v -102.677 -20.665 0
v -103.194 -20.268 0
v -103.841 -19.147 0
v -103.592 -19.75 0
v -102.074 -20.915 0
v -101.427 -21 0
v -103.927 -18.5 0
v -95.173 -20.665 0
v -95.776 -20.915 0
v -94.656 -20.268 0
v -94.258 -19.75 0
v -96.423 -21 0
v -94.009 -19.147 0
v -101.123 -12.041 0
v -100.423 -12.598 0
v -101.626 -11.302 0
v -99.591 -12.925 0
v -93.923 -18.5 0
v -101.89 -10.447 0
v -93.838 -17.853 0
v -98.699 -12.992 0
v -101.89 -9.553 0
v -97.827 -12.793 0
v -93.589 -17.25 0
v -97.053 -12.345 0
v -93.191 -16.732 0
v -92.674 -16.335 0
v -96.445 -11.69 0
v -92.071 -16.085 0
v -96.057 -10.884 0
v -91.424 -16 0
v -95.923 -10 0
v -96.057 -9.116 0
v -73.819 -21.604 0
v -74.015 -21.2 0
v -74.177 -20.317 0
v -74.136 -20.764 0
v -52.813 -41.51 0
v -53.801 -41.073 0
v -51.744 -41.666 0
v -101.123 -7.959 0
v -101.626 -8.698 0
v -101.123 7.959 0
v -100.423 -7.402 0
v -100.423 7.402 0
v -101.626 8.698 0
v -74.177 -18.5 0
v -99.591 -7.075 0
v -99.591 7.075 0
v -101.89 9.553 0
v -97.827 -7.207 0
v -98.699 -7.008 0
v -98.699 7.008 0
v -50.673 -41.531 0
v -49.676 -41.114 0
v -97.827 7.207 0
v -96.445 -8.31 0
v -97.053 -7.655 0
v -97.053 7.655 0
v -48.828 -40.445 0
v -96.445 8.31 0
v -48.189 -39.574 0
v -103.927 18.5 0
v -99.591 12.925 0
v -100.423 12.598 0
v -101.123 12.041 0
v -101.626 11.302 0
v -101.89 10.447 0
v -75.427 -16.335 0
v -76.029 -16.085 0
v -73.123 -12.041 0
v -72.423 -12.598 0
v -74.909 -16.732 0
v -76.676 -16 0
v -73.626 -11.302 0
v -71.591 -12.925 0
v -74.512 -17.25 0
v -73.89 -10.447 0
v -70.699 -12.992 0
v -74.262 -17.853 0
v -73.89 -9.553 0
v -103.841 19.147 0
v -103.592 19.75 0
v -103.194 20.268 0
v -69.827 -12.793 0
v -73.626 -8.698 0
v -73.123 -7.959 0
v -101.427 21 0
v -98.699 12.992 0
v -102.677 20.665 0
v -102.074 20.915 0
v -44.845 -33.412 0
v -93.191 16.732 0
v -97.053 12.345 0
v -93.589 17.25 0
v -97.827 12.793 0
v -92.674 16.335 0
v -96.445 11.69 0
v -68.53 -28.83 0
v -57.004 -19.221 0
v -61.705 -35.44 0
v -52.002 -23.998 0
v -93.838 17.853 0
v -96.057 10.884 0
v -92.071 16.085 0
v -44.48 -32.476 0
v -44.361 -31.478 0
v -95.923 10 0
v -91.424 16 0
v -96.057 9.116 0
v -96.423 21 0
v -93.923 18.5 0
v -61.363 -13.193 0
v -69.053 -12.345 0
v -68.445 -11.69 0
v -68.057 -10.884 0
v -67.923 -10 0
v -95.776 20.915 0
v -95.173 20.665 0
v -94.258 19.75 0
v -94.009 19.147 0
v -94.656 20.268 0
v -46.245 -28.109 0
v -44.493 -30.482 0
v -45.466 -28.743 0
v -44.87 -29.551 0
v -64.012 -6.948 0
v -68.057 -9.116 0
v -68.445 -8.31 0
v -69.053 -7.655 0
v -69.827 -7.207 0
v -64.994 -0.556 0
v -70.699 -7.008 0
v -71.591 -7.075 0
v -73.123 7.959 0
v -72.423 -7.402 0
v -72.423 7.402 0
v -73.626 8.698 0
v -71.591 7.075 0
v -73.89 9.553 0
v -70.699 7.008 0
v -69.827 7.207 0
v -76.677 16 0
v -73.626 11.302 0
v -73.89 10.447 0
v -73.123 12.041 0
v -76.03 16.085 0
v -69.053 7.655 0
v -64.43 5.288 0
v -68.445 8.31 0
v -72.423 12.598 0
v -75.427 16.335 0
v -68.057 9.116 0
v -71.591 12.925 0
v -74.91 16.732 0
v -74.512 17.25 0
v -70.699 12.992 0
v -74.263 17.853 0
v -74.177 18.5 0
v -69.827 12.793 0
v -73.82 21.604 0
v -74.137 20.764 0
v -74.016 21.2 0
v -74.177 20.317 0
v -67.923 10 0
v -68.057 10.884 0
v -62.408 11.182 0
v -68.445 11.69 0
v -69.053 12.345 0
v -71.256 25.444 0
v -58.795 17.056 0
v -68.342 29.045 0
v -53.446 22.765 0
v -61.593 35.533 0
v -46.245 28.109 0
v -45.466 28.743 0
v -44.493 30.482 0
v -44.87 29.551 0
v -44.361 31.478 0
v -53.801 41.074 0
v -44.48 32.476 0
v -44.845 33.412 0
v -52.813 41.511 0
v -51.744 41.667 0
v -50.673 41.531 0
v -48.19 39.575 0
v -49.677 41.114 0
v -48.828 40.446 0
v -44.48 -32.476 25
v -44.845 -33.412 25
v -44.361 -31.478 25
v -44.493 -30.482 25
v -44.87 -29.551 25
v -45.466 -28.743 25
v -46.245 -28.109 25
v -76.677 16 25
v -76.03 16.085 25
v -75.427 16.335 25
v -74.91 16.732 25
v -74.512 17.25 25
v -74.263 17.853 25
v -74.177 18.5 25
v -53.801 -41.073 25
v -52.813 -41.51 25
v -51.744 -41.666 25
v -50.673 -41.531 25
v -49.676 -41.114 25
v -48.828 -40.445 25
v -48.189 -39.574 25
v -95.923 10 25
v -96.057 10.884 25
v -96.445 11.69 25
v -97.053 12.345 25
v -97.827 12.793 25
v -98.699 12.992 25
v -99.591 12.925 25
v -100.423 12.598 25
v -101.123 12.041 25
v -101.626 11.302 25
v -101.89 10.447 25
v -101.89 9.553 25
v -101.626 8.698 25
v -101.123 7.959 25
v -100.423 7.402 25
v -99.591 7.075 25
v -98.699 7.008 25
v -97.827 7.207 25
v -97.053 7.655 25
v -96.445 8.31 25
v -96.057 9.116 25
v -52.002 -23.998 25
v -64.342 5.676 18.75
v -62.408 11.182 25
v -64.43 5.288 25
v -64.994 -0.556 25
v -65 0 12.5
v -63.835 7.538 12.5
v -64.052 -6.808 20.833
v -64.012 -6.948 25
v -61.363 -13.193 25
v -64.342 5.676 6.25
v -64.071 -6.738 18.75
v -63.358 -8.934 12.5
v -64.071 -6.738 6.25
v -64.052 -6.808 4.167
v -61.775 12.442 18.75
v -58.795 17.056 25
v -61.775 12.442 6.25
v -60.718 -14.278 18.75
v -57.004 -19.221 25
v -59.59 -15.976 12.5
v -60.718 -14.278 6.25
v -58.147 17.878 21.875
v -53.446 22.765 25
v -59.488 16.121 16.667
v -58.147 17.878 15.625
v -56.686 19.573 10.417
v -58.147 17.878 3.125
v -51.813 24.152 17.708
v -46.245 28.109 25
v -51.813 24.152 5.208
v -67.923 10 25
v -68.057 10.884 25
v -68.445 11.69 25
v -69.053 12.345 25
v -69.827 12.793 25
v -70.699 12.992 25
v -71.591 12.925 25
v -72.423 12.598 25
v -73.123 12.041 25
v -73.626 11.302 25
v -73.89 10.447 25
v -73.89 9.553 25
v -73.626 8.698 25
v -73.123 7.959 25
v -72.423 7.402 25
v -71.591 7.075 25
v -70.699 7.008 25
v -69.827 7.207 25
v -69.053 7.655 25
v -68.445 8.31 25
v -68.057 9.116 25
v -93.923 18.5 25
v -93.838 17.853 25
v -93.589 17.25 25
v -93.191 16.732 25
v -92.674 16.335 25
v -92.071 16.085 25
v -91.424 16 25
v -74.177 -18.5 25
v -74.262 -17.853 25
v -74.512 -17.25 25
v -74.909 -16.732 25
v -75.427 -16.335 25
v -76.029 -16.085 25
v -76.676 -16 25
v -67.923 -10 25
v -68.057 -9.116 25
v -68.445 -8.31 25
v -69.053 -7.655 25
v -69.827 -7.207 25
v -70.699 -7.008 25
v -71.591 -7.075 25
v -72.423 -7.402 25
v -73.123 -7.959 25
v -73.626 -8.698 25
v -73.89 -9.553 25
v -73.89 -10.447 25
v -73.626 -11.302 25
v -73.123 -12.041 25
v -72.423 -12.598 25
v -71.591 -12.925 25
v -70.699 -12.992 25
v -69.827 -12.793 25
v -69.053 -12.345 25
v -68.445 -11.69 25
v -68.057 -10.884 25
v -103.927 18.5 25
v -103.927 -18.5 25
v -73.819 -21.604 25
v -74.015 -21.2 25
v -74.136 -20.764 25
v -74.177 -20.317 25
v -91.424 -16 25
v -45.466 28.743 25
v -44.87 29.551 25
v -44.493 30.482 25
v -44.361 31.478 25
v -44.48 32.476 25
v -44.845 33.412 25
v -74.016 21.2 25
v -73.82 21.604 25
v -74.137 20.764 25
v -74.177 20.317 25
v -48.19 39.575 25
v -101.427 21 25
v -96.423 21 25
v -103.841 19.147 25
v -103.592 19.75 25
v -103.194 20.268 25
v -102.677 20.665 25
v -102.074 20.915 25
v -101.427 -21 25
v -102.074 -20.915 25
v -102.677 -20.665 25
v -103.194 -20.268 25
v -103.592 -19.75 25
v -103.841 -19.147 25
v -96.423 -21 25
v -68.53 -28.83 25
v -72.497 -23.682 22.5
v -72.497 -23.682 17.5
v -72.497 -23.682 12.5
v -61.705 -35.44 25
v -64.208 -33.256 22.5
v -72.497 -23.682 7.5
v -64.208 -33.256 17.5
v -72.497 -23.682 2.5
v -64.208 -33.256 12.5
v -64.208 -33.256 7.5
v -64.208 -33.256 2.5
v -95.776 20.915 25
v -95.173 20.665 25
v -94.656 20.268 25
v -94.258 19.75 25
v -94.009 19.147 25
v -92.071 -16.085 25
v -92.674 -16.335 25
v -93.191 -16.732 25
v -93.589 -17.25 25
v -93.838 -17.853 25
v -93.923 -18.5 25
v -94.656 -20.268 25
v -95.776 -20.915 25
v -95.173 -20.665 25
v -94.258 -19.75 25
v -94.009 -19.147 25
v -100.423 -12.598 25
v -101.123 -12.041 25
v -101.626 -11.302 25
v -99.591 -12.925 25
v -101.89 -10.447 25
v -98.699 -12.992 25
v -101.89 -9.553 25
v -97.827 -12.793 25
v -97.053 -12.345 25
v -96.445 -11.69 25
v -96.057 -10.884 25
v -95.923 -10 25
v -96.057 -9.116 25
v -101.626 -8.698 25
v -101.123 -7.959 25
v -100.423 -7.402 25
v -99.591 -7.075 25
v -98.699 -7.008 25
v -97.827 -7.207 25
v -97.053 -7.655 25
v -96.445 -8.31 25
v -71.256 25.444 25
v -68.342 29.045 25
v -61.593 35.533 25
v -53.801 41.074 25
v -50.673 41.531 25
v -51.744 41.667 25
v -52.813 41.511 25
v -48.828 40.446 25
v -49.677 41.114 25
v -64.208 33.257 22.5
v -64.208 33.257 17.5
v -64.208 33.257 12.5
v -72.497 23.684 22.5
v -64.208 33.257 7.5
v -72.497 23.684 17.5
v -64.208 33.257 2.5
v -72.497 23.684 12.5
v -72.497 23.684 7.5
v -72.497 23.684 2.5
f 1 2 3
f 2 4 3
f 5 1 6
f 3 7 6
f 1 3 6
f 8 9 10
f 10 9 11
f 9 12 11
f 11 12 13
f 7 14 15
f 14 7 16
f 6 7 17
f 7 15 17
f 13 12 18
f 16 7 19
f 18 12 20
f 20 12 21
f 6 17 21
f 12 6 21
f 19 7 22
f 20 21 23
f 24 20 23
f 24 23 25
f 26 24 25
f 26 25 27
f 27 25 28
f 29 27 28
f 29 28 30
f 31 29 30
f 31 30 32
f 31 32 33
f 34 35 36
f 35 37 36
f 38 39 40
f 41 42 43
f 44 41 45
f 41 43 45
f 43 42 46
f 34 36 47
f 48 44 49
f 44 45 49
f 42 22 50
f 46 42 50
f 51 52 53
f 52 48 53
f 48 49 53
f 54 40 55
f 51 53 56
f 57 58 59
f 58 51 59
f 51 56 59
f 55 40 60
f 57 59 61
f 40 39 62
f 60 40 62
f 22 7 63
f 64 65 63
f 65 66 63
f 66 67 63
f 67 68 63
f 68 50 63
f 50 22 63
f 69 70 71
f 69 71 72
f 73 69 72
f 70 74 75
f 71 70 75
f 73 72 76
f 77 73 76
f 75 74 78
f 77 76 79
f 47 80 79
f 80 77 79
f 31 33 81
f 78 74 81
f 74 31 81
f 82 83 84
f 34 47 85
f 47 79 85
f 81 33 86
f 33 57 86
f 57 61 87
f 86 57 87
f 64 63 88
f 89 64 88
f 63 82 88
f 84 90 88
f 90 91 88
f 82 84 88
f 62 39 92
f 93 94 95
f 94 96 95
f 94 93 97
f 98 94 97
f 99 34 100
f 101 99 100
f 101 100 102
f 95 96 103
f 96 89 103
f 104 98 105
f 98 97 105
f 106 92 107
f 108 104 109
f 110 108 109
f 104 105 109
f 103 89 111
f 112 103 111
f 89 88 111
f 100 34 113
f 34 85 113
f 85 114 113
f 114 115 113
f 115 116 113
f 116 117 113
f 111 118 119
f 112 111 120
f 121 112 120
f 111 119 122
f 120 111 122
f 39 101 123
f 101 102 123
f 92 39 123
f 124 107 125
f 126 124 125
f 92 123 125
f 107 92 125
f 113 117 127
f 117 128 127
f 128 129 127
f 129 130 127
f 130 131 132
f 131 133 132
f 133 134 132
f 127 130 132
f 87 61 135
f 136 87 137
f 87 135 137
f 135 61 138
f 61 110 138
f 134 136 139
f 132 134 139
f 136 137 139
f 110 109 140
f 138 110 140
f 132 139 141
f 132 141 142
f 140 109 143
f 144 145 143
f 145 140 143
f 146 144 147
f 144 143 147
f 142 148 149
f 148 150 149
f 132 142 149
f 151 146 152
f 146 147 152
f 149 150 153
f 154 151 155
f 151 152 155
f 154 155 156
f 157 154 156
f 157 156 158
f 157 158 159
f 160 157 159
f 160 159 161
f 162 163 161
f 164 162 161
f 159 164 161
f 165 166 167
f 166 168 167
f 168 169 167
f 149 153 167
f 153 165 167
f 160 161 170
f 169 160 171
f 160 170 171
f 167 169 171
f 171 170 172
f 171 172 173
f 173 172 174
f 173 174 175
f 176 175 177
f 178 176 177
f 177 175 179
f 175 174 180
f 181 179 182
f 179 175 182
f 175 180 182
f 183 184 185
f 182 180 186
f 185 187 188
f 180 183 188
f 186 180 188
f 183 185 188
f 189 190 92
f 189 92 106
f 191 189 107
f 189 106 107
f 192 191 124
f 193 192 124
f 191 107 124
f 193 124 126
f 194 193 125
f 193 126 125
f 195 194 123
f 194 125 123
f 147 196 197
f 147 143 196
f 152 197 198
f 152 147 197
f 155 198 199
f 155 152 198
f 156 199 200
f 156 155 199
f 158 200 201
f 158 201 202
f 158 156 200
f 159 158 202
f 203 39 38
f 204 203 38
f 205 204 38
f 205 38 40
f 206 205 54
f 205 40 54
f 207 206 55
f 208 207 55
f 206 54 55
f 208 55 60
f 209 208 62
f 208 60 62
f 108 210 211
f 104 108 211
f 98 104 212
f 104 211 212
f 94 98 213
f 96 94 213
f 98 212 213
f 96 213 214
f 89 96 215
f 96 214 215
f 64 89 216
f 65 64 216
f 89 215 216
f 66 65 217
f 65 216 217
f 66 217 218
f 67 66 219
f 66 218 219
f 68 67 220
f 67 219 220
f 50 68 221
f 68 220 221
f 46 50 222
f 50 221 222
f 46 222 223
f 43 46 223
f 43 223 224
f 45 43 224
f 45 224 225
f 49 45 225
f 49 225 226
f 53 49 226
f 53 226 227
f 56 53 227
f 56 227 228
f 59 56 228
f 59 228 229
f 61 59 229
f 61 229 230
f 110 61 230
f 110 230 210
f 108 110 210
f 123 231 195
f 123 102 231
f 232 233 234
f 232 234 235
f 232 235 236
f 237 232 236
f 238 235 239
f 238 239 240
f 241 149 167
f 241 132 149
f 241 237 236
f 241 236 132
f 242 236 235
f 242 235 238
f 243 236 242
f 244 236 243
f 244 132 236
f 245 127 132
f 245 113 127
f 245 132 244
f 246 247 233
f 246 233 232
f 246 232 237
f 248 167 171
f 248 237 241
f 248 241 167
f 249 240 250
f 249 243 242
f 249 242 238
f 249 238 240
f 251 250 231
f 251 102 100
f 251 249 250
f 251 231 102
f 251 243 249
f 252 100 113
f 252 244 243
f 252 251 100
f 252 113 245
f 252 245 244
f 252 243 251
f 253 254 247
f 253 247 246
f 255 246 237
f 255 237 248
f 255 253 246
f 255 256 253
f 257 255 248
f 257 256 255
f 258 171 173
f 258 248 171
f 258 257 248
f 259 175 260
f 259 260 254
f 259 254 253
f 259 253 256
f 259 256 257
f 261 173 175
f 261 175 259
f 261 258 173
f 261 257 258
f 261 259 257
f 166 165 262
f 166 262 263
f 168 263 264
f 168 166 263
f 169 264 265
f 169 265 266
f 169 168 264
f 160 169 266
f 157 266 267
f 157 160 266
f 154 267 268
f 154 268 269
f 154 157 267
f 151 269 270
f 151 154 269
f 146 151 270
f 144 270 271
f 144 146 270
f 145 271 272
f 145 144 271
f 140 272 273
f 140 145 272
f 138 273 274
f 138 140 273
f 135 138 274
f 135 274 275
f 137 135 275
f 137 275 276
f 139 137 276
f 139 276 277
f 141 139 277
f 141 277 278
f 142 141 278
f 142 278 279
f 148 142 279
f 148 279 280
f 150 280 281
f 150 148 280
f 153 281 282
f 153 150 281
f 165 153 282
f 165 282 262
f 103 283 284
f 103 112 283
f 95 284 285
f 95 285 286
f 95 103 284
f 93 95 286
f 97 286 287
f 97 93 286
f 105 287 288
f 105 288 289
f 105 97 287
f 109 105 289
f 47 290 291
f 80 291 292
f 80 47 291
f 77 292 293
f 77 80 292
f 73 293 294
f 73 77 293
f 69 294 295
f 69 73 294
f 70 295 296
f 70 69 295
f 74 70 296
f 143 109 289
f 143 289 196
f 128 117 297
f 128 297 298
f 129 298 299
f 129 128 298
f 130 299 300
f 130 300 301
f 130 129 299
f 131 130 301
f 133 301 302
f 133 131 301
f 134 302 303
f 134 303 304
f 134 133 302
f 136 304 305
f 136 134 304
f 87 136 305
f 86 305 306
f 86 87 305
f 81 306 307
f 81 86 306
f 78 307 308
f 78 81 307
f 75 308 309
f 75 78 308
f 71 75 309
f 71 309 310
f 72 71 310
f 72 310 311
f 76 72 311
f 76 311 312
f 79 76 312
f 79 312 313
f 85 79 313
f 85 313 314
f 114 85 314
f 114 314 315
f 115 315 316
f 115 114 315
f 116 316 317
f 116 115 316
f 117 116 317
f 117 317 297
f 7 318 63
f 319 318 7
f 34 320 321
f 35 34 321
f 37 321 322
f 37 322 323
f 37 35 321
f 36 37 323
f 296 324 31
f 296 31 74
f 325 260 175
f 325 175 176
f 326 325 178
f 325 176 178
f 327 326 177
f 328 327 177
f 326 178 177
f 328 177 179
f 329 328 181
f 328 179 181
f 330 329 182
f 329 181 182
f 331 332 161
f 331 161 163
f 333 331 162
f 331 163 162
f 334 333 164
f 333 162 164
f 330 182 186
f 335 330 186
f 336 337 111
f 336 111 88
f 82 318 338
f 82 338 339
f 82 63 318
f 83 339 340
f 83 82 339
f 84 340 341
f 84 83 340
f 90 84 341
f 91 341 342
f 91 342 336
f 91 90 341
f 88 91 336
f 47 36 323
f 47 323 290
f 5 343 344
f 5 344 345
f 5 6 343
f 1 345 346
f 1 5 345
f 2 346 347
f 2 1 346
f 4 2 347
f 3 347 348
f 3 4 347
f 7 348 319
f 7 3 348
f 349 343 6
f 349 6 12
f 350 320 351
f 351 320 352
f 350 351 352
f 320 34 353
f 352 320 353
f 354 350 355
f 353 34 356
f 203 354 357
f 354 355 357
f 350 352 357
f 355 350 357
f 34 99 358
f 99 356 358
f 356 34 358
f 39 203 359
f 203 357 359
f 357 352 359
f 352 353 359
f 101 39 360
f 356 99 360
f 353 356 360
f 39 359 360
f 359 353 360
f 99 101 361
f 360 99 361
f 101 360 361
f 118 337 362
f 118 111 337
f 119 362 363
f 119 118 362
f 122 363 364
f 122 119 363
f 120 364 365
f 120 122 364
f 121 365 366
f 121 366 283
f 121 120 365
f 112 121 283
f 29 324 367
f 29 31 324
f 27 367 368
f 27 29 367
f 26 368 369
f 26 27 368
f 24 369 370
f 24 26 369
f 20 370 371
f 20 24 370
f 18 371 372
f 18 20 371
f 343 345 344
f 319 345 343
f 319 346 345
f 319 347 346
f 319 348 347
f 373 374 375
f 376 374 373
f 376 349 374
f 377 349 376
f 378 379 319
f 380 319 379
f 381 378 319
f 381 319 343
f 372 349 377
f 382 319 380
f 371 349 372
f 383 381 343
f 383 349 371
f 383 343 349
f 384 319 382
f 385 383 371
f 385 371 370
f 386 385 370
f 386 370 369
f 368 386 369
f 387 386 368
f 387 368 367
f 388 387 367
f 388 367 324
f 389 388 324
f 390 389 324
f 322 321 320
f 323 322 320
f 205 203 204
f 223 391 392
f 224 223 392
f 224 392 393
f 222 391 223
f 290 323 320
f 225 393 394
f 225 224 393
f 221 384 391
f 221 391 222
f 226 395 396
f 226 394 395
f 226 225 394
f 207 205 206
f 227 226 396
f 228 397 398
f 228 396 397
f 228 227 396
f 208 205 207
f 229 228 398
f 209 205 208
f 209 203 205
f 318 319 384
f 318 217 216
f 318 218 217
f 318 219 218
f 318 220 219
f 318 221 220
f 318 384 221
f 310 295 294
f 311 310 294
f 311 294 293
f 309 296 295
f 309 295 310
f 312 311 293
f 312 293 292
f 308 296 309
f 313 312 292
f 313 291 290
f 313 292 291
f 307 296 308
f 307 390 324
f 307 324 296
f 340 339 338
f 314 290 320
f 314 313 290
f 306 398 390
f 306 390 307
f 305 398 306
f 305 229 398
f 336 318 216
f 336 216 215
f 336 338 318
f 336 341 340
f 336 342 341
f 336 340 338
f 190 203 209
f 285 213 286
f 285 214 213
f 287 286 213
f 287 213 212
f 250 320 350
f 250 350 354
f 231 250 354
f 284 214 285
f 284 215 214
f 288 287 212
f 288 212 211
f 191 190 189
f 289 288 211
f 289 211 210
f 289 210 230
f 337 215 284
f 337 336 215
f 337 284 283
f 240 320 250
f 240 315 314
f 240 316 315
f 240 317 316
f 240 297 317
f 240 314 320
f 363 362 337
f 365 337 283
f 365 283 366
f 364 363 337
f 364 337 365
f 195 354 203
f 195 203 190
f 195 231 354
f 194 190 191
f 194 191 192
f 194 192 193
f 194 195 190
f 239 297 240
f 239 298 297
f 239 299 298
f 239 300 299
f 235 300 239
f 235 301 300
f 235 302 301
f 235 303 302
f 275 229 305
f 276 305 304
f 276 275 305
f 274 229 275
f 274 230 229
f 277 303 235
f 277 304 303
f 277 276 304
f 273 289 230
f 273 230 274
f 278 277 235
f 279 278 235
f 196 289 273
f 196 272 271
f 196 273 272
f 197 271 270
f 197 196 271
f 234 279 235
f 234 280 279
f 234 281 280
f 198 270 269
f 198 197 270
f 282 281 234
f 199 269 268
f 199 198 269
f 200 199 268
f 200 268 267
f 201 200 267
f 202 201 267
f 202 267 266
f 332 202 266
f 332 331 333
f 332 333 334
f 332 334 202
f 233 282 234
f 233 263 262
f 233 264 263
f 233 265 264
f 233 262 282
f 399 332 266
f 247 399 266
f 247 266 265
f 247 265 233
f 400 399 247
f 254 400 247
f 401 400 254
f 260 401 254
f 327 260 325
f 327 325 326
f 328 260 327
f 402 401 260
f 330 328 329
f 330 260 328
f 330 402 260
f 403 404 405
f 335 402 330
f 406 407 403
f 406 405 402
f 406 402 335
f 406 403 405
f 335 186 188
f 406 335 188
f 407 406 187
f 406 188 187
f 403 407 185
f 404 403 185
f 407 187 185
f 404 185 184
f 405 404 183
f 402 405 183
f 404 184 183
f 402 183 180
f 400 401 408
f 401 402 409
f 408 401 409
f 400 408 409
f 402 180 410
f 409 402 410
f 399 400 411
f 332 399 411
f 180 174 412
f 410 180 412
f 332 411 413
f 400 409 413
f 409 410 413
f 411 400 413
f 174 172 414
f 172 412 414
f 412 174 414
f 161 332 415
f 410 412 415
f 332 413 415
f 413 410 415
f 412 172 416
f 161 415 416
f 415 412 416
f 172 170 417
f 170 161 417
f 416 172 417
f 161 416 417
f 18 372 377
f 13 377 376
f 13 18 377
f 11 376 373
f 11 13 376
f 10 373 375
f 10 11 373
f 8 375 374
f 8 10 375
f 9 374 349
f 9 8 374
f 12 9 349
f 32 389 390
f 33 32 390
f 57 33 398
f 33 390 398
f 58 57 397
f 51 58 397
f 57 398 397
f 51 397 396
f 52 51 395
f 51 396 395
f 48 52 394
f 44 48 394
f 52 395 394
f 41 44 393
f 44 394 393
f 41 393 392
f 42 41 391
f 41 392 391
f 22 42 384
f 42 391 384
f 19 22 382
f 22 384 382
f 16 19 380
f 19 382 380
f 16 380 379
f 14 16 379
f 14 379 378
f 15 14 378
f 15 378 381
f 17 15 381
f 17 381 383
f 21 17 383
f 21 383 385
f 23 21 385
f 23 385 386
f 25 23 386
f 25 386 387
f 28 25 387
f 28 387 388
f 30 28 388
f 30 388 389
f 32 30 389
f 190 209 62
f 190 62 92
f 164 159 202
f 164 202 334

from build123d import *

# Parameters (mm, degrees)
SKETCH2_R           = 3
BOSS_EXTRUDE1_DEPTH = 25
BOSS_EXTRUDE2_DEPTH = 25
SKETCH4_W           = 19.746158687
SKETCH4_H           = 5.000000001
SKETCH4_W_2         = 19.746896681
SKETCH4_H_2         = 5
CUT_EXTRUDE1_DEPTH  = 115.725186296
FILLET1_R           = 2.5
SKETCH5_R           = 3
CUT_EXTRUDE2_DEPTH  = 115.725186296


with BuildPart() as part:
    # Sketch2 → Boss-Extrude1 (new body)
    with BuildSketch(Plane.XY):
        with BuildLine():
            Line((-44.84499572, 33.411675358), (-48.18980095, 39.574873881))
            ThreePointArc((-48.18980095, 39.574873881), (-50.672758106, 41.531314894), (-53.800671062, 41.074261054))
            add(Edge.make_bspline(
                [(-53.800671062, 41.074261054), (-54.48767514, 40.651810622), (-58.202157398, 38.284629617), (-65.057392245, 32.977438932), (-72.95010089, 23.979669569), (-78.627729923, 12.632057233), (-80.687458565, 0.00103574), (-78.627967037, -12.630024416), (-72.950551026, -23.977743332), (-64.551684805, -33.55290014), (-57.571999896, -38.752778812), (-53.808586452, -41.068411447), (-53.800589503, -41.073329934)],
                knots=[5.497383927, 5.497383927, 5.497383927, 5.497383927, 5.533297999, 5.694136685, 5.890486225, 6.086835766, 6.283185307, 6.479534848, 6.675884389, 6.87223393, 7.068583471, 7.069001522, 7.069001522, 7.069001522, 7.069001522], degree=3))
            ThreePointArc((-53.800589503, -41.073329934), (-50.672539001, -41.530627312), (-48.189401667, -39.574138156))
            Line((-48.189401667, -39.574138156), (-44.84499572, -33.411675358))
            ThreePointArc((-44.84499572, -33.411675358), (-44.493215778, -30.482399972), (-46.245407837, -28.108747428))
            add(Edge.make_bspline(
                [(-46.245407837, 28.108747428), (-91.360422528, 0), (-46.245407837, -28.108747428)],
                knots=[5.50397375, 5.50397375, 5.50397375, 7.062396864, 7.062396864, 7.062396864], degree=2, weights=[1, 0.711467813, 1]))
            ThreePointArc((-46.245407837, 28.108747428), (-44.493215778, 30.482399972), (-44.84499572, 33.411675358))
        make_face()
        with Locations((-70.923488038, 10)):
            Circle(SKETCH2_R, mode=Mode.SUBTRACT)
        with Locations((-70.923488038, -10)):
            Circle(SKETCH2_R, mode=Mode.SUBTRACT)
    extrude(amount=BOSS_EXTRUDE1_DEPTH)

    # Sketch3 → Boss-Extrude2 (add)
    with BuildSketch(Plane.XY.offset(25)):
        with BuildLine():
            Line((-74.177329351, 21), (-103.926591357, 21))
            Line((-103.926591357, 21), (-103.926591357, -21))
            Line((-103.926591357, -21), (-74.176591357, -21))
            add(Edge.make_bspline(
                [(-74.177329351, 21), (-75.755958039, 18.282076683), (-78.800306246, 11.573755088), (-80.687458565, 0.00103574), (-78.800400628, -11.572472575), (-75.755678045, -18.281470977), (-74.176591357, -21)],
                knots=[5.939840224, 5.939840224, 5.939840224, 5.939840224, 6.086835766, 6.283185307, 6.479534848, 6.626565531, 6.626565531, 6.626565531, 6.626565531], degree=3))
        make_face()
    extrude(amount=-BOSS_EXTRUDE2_DEPTH)

    # Sketch4 → Cut-Extrude1 (cut, through all)
    with BuildSketch(Plane.XY.offset(25)):
        with Locations((-84.050408695, 18.500000001)):
            Rectangle(SKETCH4_W, SKETCH4_H)
        with Locations((-84.050039698, -18.5)):
            Rectangle(SKETCH4_W_2, SKETCH4_H_2)
    extrude(amount=-CUT_EXTRUDE1_DEPTH, mode=Mode.SUBTRACT)

    # Fillet1
    fillet1_edges = [part.edges().sort_by_distance(p)[0] for p in [
        (-93.923488038, 16, 12.5),
        (-93.923488038, 21.000000001, 12.5),
        (-103.926591357, -21, 12.5),
        (-93.923488038, -21, 12.5),
        (-93.923488038, -16, 12.5),
        (-74.176591357, -16, 12.5),
        (-74.176591357, -21, 12.5),
        (-74.177329351, 21, 12.5),
        (-74.177329351, 16, 12.5),
        (-103.926591357, 21, 12.5),
    ]]
    fillet(fillet1_edges, radius=FILLET1_R - 0.0001)  # a hair under: the kernel refuses the full size

    # Sketch5 → Cut-Extrude2 (cut, through all)
    with BuildSketch(Plane.XY.offset(25)):
        with Locations((-98.923488038, 10)):
            Circle(SKETCH5_R)
        with Locations((-98.923488038, -10)):
            Circle(SKETCH5_R)
    extrude(amount=-CUT_EXTRUDE2_DEPTH, mode=Mode.SUBTRACT)


solid = part.part
